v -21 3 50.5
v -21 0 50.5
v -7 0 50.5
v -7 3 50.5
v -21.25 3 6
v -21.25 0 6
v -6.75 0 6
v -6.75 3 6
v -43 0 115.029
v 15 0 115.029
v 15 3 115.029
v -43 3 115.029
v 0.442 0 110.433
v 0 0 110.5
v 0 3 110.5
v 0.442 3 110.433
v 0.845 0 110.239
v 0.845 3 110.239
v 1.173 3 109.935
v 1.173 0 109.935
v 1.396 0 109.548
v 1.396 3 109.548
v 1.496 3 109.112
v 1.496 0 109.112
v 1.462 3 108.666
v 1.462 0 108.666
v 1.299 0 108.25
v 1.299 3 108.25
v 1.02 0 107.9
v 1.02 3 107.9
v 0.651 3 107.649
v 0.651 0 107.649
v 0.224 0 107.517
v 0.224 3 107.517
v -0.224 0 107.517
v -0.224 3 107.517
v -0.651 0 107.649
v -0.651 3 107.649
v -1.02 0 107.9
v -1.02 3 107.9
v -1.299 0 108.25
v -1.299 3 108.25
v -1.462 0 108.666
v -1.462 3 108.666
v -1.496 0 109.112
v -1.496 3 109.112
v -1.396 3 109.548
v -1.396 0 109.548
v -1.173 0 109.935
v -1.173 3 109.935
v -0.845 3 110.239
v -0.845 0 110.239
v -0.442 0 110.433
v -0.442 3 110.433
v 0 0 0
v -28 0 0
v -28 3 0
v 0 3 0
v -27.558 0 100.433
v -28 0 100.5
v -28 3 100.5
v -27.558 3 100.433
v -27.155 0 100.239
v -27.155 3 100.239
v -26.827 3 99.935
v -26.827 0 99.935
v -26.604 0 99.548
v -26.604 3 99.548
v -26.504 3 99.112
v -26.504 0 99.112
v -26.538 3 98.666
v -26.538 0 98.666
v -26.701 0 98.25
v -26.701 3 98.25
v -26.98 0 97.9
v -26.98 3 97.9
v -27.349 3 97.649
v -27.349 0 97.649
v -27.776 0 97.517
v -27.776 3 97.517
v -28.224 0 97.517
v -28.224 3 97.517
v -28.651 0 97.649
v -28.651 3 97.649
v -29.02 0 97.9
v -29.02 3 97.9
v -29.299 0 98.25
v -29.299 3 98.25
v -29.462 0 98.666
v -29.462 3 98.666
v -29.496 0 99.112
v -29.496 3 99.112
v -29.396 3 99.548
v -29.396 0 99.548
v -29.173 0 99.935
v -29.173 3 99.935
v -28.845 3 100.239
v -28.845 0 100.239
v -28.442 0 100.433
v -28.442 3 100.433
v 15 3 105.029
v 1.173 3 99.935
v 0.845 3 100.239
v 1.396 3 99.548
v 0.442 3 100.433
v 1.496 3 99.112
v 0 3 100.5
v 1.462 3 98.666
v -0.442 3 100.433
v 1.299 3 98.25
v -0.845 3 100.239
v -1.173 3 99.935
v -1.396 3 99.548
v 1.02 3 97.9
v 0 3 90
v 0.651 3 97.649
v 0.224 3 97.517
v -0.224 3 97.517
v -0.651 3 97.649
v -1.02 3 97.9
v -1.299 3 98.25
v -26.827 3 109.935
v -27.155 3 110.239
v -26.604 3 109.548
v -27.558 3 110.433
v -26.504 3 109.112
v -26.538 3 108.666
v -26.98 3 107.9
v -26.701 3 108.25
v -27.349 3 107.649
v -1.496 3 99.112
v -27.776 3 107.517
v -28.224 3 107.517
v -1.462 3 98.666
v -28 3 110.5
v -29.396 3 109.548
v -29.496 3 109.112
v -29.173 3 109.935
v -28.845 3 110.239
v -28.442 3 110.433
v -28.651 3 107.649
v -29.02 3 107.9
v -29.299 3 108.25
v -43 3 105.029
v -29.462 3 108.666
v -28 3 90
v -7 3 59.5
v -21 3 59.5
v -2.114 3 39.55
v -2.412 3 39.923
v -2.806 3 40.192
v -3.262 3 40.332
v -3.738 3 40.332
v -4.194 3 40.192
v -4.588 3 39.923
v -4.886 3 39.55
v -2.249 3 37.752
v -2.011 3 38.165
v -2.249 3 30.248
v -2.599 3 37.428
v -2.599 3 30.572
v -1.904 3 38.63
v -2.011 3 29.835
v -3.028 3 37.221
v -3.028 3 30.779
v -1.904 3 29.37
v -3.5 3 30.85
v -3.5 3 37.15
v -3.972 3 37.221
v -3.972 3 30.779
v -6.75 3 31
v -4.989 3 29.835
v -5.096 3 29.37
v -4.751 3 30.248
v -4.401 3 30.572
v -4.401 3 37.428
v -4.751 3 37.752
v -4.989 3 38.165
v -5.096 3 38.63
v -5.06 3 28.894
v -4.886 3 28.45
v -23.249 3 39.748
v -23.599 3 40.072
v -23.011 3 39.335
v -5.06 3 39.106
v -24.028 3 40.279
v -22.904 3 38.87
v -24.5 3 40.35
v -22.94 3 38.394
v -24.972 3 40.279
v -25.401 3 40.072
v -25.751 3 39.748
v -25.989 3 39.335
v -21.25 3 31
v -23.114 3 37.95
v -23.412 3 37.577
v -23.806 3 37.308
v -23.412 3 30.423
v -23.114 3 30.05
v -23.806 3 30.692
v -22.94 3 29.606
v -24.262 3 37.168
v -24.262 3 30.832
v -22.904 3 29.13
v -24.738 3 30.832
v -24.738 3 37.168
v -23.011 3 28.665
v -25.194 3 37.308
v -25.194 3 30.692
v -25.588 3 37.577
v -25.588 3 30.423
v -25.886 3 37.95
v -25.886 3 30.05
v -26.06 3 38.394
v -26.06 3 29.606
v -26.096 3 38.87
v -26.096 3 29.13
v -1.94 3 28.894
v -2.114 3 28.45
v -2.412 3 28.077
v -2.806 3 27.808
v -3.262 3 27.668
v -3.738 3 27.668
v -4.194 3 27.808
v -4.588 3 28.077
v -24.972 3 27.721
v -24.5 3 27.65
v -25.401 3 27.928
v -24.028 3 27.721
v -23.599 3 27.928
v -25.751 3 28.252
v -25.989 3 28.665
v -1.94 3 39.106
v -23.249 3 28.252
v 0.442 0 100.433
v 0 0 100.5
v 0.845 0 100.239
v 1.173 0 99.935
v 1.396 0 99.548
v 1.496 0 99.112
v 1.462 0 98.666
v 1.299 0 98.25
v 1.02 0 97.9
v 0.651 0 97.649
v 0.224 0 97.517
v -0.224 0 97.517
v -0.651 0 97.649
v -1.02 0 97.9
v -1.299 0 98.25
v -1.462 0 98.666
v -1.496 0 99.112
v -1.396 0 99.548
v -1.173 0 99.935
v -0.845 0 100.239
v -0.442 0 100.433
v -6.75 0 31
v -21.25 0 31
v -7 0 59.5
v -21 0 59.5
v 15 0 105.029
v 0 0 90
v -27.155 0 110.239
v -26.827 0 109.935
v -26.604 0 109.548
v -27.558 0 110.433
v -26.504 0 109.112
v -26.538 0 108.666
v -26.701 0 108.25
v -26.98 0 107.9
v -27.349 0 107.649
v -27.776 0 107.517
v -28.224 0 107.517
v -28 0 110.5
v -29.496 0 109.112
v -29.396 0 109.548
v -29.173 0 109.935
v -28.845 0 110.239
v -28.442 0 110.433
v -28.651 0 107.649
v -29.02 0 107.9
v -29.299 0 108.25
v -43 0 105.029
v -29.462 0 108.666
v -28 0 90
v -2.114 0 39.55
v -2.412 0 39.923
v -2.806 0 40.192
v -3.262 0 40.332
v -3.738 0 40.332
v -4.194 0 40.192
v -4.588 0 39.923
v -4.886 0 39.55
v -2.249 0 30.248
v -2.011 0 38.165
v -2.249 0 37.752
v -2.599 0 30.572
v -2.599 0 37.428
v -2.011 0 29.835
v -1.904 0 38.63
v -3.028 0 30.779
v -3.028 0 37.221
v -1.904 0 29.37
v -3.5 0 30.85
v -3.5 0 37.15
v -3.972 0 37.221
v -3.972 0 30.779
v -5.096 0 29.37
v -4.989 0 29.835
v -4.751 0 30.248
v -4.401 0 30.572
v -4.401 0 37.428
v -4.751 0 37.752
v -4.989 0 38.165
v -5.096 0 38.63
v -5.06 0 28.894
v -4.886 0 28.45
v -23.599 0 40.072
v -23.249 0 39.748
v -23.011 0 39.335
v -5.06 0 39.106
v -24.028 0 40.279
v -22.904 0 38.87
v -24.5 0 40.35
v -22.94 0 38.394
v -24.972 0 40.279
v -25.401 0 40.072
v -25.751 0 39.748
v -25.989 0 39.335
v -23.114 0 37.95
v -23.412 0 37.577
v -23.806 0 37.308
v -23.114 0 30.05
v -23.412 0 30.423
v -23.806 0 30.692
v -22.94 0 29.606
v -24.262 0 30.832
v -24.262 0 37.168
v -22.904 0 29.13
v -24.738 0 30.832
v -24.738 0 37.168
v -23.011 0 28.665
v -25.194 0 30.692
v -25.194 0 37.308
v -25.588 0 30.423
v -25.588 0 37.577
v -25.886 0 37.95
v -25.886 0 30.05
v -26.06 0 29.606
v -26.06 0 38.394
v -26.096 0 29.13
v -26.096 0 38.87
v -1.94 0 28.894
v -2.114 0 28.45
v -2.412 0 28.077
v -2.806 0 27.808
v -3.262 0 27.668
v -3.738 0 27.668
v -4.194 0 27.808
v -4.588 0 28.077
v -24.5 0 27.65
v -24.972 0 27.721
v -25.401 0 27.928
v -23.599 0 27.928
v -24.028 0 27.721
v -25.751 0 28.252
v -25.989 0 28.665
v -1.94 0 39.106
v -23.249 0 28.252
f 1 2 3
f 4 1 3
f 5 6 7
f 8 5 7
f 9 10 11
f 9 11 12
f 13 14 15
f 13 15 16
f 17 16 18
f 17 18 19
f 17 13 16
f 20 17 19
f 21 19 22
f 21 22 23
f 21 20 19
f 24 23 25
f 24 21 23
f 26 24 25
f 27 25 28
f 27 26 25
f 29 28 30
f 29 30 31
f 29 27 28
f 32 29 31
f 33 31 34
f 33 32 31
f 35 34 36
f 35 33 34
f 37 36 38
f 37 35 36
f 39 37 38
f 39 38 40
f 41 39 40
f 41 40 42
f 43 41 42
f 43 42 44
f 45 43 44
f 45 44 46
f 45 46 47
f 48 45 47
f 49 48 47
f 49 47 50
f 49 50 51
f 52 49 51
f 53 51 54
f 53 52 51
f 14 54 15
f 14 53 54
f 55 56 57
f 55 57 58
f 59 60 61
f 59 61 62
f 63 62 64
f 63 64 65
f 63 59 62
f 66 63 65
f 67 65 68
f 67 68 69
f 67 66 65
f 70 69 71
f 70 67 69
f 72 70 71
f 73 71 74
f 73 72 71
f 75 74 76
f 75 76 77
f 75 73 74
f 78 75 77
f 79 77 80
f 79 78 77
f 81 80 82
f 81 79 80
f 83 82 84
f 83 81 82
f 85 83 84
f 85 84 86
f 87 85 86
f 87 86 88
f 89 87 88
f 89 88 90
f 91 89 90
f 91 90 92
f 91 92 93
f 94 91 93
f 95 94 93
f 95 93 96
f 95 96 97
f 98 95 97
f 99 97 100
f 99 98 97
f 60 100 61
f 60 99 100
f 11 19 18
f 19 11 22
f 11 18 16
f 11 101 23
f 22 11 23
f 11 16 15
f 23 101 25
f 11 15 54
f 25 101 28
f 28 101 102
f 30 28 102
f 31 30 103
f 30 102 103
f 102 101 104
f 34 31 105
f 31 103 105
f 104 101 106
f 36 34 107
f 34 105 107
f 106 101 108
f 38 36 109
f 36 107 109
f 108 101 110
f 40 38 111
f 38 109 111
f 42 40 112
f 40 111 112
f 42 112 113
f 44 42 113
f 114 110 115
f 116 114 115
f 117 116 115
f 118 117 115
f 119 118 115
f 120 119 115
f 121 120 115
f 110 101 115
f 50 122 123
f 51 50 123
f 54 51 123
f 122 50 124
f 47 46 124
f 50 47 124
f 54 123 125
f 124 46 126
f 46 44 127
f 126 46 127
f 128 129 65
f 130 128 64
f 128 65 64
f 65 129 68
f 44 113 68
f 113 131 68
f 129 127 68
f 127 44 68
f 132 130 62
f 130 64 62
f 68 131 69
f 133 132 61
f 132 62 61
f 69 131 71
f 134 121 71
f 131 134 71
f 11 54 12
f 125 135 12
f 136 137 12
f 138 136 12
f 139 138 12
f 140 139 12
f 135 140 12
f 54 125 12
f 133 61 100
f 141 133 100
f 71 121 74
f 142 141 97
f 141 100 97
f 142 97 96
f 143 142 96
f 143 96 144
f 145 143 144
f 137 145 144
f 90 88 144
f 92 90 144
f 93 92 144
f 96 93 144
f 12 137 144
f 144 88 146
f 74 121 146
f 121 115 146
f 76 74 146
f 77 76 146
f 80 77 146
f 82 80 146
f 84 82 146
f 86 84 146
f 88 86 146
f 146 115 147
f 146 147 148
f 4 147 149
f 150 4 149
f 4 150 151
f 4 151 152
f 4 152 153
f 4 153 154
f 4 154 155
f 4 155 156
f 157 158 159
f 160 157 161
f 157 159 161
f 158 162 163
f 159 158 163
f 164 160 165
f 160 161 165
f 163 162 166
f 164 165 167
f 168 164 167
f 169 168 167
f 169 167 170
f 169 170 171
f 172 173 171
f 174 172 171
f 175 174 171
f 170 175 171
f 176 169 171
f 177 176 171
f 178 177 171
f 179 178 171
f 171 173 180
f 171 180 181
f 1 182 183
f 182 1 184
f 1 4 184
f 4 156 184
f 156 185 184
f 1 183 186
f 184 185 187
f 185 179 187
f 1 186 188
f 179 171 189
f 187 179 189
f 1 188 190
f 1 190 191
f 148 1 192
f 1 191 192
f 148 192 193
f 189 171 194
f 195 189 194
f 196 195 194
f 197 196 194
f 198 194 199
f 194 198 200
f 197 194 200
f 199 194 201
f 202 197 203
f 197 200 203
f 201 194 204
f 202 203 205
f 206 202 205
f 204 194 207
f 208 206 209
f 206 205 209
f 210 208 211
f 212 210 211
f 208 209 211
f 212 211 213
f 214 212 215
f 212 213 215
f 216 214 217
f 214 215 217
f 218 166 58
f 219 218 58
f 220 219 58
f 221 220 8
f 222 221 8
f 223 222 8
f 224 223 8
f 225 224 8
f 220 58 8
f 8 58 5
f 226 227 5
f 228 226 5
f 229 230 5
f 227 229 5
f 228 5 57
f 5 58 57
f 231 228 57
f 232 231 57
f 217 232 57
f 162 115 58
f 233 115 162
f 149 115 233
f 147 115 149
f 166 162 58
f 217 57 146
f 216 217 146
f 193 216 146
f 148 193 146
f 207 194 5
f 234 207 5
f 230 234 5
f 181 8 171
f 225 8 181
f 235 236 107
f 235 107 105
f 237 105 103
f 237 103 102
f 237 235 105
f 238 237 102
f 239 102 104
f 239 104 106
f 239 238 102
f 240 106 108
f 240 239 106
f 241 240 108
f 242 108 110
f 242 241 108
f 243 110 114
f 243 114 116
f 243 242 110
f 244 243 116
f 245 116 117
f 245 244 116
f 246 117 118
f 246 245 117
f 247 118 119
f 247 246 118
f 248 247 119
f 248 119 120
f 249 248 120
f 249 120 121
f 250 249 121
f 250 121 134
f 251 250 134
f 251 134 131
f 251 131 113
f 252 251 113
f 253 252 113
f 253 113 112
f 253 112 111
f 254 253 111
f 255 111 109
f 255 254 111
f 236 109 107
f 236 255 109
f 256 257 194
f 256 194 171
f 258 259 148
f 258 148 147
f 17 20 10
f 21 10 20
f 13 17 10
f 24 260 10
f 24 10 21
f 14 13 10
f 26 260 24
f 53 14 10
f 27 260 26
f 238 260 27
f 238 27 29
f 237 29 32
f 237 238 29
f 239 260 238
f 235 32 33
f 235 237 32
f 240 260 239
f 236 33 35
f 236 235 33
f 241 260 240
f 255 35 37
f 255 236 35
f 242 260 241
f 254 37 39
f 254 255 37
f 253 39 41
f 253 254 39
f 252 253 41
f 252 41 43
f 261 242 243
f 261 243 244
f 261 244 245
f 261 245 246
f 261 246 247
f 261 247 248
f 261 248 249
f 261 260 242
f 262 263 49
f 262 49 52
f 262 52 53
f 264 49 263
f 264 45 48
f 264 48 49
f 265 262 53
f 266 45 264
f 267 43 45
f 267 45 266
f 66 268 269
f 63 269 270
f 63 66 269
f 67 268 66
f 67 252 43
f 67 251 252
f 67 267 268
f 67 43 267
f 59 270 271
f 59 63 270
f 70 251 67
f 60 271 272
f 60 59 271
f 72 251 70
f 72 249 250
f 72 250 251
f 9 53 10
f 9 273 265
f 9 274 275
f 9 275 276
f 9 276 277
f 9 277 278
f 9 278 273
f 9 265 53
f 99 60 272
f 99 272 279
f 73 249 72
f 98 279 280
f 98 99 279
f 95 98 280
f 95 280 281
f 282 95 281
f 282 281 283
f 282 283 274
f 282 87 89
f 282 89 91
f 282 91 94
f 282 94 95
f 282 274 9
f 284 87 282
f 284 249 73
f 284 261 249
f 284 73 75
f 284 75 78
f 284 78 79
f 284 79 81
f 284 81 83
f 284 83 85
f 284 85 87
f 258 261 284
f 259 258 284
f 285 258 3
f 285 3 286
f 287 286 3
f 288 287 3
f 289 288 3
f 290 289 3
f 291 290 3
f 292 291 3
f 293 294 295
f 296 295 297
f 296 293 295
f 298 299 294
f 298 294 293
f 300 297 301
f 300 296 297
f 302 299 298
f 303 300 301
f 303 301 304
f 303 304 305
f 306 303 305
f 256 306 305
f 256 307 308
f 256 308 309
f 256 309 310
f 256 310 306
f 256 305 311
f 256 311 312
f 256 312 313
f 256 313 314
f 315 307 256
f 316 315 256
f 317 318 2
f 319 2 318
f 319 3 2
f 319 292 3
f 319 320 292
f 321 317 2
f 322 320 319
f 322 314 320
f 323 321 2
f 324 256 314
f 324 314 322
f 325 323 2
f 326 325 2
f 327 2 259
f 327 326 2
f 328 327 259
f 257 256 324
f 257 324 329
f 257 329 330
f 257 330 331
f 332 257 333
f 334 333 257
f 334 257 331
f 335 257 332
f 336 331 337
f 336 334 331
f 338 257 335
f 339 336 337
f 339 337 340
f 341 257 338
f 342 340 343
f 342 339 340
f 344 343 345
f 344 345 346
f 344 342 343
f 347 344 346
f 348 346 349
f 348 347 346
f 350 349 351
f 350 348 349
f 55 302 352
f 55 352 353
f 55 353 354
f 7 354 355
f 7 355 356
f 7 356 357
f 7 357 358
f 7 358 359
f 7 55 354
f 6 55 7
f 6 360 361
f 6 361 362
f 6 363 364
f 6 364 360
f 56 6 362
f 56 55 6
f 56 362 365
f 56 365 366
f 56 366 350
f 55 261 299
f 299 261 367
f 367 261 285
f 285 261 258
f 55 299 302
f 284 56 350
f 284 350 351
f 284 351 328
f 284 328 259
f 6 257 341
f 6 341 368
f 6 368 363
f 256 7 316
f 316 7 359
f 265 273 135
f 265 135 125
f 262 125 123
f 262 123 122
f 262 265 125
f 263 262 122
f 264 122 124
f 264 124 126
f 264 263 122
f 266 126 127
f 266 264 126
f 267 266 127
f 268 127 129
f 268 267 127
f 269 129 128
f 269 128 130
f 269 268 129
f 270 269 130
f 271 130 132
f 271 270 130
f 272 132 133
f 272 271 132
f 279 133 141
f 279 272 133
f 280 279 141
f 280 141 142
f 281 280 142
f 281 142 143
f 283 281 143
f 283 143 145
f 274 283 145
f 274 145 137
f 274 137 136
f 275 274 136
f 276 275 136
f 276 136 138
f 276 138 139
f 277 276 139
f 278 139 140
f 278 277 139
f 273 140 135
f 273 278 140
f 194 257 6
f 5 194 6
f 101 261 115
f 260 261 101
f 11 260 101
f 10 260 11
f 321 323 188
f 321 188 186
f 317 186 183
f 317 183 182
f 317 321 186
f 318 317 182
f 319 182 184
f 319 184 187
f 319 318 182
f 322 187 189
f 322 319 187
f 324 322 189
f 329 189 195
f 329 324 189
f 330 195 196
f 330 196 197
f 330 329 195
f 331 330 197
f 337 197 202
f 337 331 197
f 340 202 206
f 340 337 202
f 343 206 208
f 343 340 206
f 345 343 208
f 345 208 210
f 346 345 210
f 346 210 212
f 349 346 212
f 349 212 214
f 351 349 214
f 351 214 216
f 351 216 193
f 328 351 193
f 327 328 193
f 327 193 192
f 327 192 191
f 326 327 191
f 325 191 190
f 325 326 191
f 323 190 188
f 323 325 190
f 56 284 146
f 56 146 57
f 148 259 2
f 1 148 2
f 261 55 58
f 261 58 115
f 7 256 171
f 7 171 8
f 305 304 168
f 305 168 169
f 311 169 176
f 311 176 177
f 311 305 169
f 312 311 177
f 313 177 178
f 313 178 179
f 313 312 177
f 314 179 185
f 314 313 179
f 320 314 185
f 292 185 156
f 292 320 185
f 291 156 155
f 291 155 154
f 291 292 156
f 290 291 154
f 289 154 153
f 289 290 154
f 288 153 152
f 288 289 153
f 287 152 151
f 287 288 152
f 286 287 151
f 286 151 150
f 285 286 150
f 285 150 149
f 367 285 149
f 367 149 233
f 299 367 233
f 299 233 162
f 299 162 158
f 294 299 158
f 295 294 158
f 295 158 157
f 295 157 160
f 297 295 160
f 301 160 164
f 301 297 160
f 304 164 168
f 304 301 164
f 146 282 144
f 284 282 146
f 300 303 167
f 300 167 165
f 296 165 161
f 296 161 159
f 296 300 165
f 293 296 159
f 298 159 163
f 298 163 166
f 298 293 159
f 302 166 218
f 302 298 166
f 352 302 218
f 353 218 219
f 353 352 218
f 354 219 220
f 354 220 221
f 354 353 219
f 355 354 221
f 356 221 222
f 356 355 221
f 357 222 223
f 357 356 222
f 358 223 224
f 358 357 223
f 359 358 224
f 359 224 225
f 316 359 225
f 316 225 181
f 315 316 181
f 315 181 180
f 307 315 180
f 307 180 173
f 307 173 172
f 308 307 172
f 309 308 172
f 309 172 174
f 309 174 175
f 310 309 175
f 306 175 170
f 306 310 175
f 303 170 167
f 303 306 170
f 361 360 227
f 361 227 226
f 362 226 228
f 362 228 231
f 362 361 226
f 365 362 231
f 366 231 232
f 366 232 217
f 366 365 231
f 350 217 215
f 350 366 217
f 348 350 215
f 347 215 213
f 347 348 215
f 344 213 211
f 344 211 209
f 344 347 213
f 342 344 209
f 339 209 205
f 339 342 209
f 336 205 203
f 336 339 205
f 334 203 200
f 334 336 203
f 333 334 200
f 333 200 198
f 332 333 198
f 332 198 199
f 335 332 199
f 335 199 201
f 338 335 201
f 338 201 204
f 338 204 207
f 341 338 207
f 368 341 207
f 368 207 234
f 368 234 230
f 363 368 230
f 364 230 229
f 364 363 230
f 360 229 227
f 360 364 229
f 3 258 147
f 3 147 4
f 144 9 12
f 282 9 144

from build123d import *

# Parameters (mm, degrees)
SKETCH1_R           = 1.6
SKETCH1_R_2         = 1.5
SKETCH1_W           = 14
SKETCH1_H           = 9
SKETCH1_W_2         = 14.5
SKETCH1_H_2         = 25
BOSS_EXTRUDE1_DEPTH = 3


with BuildPart() as part:
    # Sketch1 → Boss-Extrude1 (new body)
    with BuildSketch(Plane(origin=(0, 0, 0), x_dir=(1, 0, 0), z_dir=(0, 1, 0))):
        Polygon((0, 0), (0, -90), (15, -105.02919784), (15, -115.02919784), (-43, -115.02919784), (-43, -105.02919784), (-28, -90), (-28, 0), align=None)
        with Locations(Location((-24.5, -38.75, 0), (0, 0, 270))):
            Circle(SKETCH1_R, mode=Mode.SUBTRACT)
        with Locations(Location((-3.5, -38.75, 0), (0, 0, 90))):
            Circle(SKETCH1_R, mode=Mode.SUBTRACT)
        with Locations(Location((-3.5, -29.25, 0), (0, 0, 270))):
            Circle(SKETCH1_R, mode=Mode.SUBTRACT)
        with Locations(Location((-24.5, -29.25, 0), (0, 0, 90))):
            Circle(SKETCH1_R, mode=Mode.SUBTRACT)
        with Locations(Location((-28, -99, 0), (0, 0, 270))):
            Circle(SKETCH1_R_2, mode=Mode.SUBTRACT)
        with Locations(Location((0, -99, 0), (0, 0, 270))):
            Circle(SKETCH1_R_2, mode=Mode.SUBTRACT)
        with Locations(Location((-28, -109, 0), (0, 0, 270))):
            Circle(SKETCH1_R_2, mode=Mode.SUBTRACT)
        with Locations(Location((0, -109, 0), (0, 0, 270))):
            Circle(SKETCH1_R_2, mode=Mode.SUBTRACT)
        with Locations((-14, -55)):
            Rectangle(SKETCH1_W, SKETCH1_H, mode=Mode.SUBTRACT)
        with Locations((-14, -18.5)):
            Rectangle(SKETCH1_W_2, SKETCH1_H_2, mode=Mode.SUBTRACT)
    extrude(amount=BOSS_EXTRUDE1_DEPTH)


solid = part.part
